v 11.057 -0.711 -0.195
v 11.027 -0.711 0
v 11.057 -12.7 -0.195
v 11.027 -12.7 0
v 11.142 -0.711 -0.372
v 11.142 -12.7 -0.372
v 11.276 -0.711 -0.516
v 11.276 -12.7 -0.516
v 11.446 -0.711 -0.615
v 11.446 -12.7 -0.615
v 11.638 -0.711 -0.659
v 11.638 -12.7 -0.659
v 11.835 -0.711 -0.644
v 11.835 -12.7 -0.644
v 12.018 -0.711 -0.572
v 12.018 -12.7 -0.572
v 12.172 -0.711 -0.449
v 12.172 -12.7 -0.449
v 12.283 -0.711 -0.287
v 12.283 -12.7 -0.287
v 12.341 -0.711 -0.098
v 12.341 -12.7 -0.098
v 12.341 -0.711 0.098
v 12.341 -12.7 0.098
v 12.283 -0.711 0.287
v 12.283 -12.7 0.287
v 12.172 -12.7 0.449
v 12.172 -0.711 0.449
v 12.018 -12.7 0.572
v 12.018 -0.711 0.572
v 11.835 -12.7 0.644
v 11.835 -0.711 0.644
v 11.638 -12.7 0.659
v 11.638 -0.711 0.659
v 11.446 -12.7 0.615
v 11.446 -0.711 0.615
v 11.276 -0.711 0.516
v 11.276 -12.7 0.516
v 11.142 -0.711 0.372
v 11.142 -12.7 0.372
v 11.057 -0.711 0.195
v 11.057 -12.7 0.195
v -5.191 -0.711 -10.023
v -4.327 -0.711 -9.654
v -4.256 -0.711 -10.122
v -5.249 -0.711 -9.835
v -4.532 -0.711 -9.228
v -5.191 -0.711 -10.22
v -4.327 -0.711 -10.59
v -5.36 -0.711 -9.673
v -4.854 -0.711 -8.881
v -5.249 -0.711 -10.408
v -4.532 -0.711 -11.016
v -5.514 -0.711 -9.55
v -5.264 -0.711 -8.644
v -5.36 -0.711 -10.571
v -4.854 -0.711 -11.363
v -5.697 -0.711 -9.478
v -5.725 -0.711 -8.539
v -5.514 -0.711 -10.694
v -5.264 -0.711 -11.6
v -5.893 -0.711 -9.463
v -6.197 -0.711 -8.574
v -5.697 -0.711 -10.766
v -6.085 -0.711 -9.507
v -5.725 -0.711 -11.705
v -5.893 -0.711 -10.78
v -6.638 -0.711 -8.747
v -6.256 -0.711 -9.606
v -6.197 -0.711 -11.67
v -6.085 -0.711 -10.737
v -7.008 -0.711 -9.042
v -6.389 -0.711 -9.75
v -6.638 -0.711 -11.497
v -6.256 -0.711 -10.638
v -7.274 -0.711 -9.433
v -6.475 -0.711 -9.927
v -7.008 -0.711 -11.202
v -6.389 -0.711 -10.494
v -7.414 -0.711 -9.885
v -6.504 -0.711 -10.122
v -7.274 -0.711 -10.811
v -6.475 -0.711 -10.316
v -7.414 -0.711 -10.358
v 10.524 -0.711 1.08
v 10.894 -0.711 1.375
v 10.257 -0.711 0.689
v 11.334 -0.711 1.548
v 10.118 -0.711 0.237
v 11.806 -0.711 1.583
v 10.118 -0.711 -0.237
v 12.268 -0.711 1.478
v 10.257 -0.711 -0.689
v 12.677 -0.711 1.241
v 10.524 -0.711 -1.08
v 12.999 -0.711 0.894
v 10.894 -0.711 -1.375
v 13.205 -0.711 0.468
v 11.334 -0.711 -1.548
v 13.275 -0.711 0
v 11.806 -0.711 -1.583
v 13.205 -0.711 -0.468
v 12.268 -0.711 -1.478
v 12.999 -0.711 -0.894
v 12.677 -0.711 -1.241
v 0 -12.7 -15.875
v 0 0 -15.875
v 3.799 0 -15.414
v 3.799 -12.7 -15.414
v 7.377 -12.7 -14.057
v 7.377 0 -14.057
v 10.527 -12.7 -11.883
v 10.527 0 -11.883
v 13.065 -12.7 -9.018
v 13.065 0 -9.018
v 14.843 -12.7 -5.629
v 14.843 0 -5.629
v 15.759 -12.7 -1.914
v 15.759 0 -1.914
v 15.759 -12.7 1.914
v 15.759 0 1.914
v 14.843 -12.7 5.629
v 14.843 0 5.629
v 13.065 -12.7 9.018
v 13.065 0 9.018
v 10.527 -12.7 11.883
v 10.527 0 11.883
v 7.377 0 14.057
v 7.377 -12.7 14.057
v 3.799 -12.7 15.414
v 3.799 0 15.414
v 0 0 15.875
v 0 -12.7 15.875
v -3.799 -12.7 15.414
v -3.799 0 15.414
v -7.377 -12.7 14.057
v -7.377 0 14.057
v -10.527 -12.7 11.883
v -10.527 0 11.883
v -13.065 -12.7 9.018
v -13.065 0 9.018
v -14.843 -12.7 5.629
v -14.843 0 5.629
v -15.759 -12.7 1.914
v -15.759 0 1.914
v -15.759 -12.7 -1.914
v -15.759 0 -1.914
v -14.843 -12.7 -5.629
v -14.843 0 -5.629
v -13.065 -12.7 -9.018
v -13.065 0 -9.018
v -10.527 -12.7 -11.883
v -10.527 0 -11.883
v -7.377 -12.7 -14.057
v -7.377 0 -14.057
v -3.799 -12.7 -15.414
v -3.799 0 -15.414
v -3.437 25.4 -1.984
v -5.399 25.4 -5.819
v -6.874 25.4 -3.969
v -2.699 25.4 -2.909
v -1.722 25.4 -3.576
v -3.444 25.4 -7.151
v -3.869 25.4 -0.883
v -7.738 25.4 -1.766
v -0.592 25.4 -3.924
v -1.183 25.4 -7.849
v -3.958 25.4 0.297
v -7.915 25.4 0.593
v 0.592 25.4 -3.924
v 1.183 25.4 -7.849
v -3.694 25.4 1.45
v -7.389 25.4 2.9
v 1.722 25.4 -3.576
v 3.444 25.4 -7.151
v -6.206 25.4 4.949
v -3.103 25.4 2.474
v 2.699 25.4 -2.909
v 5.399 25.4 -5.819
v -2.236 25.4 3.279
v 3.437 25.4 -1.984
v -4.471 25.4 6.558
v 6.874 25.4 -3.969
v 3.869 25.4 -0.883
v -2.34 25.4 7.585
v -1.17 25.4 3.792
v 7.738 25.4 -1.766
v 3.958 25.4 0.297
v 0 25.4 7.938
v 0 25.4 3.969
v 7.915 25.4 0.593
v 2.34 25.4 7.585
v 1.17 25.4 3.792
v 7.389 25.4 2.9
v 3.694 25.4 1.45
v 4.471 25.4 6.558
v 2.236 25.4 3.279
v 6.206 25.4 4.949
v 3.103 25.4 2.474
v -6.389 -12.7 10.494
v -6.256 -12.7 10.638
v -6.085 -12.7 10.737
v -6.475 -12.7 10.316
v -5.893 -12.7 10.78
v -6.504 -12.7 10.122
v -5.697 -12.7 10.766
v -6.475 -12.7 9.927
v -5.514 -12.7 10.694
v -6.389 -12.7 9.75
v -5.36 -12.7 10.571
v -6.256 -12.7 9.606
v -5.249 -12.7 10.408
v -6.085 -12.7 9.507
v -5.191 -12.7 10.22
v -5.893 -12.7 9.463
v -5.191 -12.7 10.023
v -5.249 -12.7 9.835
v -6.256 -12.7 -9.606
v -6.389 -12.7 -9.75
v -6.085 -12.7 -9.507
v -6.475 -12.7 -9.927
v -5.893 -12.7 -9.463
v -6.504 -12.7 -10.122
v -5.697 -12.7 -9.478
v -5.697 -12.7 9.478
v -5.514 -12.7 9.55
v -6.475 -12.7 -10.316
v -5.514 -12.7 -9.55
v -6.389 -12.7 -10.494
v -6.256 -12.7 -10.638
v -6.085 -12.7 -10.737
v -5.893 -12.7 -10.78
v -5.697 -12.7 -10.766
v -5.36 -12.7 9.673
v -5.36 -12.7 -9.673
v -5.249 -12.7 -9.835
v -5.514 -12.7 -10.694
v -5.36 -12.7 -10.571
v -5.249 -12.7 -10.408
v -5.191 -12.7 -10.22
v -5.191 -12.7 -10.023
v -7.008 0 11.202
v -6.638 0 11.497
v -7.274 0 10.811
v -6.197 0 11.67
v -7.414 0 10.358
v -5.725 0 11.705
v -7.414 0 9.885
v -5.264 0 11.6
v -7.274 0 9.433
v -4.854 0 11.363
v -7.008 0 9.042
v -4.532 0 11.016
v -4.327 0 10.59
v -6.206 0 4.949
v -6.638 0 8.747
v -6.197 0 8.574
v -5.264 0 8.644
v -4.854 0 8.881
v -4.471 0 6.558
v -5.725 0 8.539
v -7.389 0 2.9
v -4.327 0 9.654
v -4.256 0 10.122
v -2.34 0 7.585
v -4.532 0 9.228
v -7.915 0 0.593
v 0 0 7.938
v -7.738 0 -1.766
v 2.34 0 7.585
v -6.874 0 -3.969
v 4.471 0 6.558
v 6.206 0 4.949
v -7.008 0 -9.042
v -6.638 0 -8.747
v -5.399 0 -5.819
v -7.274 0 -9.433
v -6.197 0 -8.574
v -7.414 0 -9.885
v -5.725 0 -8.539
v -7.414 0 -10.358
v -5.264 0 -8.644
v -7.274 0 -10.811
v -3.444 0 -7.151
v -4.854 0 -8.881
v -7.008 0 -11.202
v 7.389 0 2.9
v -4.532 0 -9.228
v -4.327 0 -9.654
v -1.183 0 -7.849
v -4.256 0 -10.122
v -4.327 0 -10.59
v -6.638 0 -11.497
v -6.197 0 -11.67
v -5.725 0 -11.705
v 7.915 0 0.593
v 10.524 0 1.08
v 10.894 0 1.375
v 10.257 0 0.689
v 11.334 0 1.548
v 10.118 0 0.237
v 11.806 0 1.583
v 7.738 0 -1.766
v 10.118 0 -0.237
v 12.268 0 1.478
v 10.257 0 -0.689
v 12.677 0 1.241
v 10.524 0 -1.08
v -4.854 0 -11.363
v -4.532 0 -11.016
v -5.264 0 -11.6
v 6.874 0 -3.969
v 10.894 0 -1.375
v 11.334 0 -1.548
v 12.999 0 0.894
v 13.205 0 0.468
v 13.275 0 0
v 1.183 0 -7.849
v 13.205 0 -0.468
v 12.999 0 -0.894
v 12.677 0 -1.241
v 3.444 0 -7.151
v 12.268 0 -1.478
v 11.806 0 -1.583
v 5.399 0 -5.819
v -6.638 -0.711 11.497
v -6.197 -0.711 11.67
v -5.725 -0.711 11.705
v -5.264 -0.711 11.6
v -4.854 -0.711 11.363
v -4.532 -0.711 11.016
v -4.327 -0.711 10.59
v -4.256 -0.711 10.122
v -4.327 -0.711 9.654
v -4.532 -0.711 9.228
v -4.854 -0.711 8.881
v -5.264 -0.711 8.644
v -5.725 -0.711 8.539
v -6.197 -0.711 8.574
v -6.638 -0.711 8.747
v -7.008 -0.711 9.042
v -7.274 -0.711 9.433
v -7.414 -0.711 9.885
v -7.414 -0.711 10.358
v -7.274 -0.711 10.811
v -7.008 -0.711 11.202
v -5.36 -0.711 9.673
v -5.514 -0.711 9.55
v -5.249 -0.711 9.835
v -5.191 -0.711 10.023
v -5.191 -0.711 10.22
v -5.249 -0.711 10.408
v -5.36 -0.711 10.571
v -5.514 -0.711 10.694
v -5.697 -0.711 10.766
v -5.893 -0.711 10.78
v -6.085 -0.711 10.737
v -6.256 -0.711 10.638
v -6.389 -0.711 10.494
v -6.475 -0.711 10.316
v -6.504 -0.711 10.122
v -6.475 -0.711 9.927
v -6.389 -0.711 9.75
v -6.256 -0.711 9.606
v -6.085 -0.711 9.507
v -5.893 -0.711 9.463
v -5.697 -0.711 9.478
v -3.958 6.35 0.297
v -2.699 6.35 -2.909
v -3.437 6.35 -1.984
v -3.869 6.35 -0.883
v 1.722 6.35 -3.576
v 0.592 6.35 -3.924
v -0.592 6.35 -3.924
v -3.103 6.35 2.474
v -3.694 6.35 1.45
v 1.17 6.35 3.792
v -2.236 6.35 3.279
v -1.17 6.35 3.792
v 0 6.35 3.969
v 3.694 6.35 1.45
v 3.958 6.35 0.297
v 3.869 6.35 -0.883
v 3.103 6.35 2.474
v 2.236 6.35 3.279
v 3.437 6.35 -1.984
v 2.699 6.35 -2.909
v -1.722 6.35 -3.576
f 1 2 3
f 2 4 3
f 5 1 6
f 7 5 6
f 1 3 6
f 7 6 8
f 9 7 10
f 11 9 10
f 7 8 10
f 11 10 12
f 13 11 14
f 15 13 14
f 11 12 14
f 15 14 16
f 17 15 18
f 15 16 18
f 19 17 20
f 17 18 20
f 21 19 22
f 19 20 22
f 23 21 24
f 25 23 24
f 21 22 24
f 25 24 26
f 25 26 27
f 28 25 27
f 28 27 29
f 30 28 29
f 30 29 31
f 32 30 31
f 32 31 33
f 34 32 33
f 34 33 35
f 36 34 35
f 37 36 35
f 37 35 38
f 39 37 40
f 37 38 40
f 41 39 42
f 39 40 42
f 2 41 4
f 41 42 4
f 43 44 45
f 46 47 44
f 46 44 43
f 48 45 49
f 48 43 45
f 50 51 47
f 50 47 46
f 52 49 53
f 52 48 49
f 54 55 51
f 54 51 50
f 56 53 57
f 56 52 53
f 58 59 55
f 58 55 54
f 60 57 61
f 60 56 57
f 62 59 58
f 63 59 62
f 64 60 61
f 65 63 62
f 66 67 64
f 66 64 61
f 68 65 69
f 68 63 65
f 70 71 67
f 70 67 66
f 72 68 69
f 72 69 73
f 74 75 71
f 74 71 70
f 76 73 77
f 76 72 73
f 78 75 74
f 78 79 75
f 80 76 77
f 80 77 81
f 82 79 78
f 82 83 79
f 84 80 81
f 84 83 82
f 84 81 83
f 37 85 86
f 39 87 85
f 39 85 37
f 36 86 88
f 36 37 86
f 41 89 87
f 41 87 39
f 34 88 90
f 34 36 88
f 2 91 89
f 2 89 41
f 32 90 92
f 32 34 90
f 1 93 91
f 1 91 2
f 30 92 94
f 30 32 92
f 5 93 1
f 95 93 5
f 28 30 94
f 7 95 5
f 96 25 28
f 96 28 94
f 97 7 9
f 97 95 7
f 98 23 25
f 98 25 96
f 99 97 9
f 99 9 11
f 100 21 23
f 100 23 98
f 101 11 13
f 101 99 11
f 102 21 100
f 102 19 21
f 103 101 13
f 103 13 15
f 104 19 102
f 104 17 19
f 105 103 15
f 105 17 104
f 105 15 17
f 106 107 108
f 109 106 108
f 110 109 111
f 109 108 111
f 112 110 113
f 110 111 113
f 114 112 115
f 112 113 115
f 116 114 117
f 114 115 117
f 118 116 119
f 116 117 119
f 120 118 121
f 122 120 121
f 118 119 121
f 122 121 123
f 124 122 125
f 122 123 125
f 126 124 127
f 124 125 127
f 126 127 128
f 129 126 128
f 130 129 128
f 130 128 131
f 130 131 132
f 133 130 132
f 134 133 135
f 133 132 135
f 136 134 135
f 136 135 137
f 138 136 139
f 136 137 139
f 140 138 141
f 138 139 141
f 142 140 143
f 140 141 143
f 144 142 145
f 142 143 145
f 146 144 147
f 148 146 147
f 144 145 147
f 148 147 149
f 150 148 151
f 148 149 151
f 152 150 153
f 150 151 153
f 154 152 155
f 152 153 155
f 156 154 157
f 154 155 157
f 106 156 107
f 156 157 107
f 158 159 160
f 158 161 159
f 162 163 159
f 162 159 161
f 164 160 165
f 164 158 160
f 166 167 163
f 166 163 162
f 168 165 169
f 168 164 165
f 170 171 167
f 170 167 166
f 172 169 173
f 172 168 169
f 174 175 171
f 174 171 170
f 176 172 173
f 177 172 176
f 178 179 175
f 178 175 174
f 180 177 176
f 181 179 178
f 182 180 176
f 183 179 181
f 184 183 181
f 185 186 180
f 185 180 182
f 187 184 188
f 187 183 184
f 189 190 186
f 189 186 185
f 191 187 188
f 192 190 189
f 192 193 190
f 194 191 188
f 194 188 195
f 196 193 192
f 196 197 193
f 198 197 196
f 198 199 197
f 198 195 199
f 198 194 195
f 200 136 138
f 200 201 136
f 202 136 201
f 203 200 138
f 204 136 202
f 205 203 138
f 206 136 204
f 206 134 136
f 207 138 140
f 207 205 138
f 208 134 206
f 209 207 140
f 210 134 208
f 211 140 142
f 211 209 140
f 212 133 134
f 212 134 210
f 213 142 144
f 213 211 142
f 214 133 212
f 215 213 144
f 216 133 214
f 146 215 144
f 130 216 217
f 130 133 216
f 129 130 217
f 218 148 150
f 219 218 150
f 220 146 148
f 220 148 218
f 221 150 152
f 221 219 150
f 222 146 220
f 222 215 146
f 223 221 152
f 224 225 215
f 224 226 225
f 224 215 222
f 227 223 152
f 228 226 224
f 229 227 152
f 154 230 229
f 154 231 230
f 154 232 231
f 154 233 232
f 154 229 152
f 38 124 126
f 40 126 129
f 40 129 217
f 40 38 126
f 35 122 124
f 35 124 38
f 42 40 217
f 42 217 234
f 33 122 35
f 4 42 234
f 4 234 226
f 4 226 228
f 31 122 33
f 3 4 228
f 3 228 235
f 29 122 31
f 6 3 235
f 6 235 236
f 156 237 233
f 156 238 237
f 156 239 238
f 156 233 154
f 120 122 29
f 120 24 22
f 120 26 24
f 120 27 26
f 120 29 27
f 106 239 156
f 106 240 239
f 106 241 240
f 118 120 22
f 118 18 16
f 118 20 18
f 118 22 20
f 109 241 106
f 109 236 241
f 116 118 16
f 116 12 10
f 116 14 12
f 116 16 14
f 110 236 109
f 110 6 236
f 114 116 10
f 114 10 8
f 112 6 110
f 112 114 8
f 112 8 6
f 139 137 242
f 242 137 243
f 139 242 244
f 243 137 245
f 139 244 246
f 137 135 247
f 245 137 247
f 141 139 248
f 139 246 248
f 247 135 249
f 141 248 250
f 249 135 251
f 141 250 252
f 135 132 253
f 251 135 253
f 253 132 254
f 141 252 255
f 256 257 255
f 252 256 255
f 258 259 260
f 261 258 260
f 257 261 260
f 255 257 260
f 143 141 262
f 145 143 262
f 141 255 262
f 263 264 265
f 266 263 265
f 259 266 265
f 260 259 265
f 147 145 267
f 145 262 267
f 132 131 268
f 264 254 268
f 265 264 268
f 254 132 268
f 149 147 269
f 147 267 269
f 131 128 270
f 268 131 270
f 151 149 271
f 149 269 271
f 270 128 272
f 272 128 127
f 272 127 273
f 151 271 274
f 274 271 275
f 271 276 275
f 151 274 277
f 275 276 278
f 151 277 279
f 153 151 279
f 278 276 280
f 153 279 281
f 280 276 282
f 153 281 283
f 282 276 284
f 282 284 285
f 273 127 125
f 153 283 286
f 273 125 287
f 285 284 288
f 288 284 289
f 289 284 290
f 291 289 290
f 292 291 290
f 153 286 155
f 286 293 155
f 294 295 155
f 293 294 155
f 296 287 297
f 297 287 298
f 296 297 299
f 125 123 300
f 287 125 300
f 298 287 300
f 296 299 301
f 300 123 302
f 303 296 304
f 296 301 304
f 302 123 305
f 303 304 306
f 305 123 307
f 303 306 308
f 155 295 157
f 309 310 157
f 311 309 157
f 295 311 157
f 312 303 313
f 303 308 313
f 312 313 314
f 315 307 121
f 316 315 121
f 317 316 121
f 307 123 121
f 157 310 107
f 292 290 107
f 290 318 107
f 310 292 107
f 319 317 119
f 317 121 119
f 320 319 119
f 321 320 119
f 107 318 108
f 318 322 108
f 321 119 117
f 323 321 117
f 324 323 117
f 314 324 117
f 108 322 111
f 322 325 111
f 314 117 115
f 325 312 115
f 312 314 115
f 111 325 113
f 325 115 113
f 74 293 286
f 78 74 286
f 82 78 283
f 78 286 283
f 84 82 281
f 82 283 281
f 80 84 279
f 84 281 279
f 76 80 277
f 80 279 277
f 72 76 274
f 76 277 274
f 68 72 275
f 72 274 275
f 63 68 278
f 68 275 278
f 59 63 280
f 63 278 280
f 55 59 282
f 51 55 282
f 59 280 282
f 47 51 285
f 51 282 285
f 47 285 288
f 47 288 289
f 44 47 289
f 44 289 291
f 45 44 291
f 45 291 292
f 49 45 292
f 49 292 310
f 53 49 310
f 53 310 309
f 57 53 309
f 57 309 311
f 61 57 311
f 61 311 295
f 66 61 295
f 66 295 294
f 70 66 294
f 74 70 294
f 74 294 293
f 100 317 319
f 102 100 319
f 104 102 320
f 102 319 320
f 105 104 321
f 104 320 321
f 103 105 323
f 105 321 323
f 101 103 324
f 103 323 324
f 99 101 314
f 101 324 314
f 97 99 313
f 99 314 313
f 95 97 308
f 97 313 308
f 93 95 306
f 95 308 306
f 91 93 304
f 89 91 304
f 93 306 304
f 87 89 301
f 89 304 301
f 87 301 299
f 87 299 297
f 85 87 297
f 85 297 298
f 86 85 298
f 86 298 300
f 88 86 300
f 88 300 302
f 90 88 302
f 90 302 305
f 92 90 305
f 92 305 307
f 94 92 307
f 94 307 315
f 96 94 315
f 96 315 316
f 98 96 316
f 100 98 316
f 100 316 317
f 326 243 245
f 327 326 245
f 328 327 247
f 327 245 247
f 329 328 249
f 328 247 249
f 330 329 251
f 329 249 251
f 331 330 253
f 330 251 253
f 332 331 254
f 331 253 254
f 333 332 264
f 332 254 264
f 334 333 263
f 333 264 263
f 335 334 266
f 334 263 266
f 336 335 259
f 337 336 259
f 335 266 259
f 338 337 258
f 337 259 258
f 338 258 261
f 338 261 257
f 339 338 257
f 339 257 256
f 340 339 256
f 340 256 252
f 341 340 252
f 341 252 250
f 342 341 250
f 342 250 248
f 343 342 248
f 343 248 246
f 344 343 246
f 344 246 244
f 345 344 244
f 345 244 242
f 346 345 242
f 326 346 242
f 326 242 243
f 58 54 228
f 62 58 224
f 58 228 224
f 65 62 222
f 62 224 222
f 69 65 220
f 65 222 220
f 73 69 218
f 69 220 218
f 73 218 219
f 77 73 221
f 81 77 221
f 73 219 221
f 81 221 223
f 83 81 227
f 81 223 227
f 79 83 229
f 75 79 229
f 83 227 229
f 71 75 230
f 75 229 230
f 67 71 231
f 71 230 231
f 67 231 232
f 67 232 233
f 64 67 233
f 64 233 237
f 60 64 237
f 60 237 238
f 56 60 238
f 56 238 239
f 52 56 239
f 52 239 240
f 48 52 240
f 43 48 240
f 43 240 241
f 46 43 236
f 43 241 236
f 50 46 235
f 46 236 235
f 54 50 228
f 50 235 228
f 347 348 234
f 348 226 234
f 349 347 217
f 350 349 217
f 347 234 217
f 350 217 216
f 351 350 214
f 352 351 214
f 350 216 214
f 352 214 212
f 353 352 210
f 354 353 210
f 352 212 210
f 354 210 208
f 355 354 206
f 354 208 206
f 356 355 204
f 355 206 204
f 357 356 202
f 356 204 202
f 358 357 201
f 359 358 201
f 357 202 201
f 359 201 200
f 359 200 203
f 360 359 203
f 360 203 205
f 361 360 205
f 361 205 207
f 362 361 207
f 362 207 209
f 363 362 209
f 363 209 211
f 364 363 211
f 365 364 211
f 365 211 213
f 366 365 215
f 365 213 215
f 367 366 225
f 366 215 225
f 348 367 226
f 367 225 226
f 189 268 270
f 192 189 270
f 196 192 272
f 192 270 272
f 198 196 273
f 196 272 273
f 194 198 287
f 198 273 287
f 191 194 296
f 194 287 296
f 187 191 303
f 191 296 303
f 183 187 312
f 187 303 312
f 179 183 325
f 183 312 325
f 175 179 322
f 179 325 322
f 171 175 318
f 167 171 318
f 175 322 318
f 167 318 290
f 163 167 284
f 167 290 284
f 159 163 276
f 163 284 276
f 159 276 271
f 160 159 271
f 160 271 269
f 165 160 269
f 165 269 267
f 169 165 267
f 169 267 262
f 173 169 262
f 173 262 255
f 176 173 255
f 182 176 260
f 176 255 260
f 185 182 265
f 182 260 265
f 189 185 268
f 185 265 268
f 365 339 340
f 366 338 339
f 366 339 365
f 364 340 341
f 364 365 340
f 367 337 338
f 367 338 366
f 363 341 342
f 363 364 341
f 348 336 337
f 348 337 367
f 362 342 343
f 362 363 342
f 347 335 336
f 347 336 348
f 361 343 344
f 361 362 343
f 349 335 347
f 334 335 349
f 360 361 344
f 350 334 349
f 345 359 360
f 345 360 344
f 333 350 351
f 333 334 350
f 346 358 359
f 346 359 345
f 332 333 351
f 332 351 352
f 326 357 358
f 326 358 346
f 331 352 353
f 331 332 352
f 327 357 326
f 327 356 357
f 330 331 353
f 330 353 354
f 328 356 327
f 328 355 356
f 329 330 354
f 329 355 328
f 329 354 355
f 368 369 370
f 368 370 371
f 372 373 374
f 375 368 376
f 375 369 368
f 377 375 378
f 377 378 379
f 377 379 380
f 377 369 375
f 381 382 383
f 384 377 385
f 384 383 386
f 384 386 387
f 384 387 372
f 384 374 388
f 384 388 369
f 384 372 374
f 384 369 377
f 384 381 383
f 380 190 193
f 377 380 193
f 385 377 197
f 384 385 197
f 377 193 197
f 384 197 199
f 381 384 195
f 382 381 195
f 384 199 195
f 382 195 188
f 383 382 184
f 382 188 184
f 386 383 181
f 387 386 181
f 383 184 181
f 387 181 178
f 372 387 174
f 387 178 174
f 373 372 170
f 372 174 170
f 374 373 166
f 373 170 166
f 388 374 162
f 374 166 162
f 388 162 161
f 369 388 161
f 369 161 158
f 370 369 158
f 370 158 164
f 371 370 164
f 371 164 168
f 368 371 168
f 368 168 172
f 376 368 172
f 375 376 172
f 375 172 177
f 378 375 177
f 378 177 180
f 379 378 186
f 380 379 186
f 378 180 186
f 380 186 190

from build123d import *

# Parameters (mm, degrees)
SKETCH1_R                                           = 7.9375
BOSS_EXTRUDE1_DEPTH                                 = 25.4
SKETCH2_R                                           = 15.875
BOSS_EXTRUDE2_DEPTH                                 = 12.7
SKETCH3_R                                           = 3.96875
CUT_EXTRUDE1_DEPTH                                  = 19.05
CBORE_FOR_00_BINDING_HEAD_MACHINE_SCREW_D           = 1.3208
CBORE_FOR_00_BINDING_HEAD_MACHINE_SCREW_CBORE_D     = 3.175
CBORE_FOR_00_BINDING_HEAD_MACHINE_SCREW_CBORE_DEPTH = 0.7112
CIRPATTERN1_COUNT                                   = 3


with BuildPart() as part:
    # Sketch1 → Boss-Extrude1 (new body)
    with BuildSketch(Plane(origin=(0, 0, 0), x_dir=(1, 0, 0), z_dir=(0, 1, 0))):
        with Locations(Location((0, 0, 0), (0, 0, 270))):
            Circle(SKETCH1_R)
    extrude(amount=BOSS_EXTRUDE1_DEPTH)

    # Sketch2 → Boss-Extrude2 (add)
    with BuildSketch(Plane(origin=(0, 0, 0), x_dir=(-1, 0, 0), z_dir=(0, -1, 0))):
        with Locations(Location((0, 0, 0), (0, 0, 90))):
            Circle(SKETCH2_R)
    extrude(amount=BOSS_EXTRUDE2_DEPTH)

    # Sketch3 → Cut-Extrude1 (cut)
    with BuildSketch(Plane(origin=(0, 25.4, 0), x_dir=(1, 0, 0), z_dir=(0, 1, 0))):
        with Locations(Location((0, 0, 0), (0, 0, 270))):
            Circle(SKETCH3_R)
    extrude(amount=-CUT_EXTRUDE1_DEPTH, mode=Mode.SUBTRACT)

    # CBORE for #00 Binding Head Machine Screw1 (through all)
    with Locations(Plane(origin=(0, 0, 0), x_dir=(1, 0, 0), z_dir=(0, 1, 0))):
        with Locations((11.687693986, 0)):
            cbore_for_00_binding_head_machine_screw = CounterBoreHole(CBORE_FOR_00_BINDING_HEAD_MACHINE_SCREW_D / 2, CBORE_FOR_00_BINDING_HEAD_MACHINE_SCREW_CBORE_D / 2, CBORE_FOR_00_BINDING_HEAD_MACHINE_SCREW_CBORE_DEPTH)

    # CirPattern1: CBORE for #00 Binding Head Machine Screw1 ×3 about axis
    cirpattern1_axis = Axis((0, 0, 0), (0, 1, 0))
    for i in range(1, CIRPATTERN1_COUNT):
        add(cbore_for_00_binding_head_machine_screw.rotate(cirpattern1_axis, i * 360 / CIRPATTERN1_COUNT), mode=Mode.SUBTRACT)


solid = part.part
